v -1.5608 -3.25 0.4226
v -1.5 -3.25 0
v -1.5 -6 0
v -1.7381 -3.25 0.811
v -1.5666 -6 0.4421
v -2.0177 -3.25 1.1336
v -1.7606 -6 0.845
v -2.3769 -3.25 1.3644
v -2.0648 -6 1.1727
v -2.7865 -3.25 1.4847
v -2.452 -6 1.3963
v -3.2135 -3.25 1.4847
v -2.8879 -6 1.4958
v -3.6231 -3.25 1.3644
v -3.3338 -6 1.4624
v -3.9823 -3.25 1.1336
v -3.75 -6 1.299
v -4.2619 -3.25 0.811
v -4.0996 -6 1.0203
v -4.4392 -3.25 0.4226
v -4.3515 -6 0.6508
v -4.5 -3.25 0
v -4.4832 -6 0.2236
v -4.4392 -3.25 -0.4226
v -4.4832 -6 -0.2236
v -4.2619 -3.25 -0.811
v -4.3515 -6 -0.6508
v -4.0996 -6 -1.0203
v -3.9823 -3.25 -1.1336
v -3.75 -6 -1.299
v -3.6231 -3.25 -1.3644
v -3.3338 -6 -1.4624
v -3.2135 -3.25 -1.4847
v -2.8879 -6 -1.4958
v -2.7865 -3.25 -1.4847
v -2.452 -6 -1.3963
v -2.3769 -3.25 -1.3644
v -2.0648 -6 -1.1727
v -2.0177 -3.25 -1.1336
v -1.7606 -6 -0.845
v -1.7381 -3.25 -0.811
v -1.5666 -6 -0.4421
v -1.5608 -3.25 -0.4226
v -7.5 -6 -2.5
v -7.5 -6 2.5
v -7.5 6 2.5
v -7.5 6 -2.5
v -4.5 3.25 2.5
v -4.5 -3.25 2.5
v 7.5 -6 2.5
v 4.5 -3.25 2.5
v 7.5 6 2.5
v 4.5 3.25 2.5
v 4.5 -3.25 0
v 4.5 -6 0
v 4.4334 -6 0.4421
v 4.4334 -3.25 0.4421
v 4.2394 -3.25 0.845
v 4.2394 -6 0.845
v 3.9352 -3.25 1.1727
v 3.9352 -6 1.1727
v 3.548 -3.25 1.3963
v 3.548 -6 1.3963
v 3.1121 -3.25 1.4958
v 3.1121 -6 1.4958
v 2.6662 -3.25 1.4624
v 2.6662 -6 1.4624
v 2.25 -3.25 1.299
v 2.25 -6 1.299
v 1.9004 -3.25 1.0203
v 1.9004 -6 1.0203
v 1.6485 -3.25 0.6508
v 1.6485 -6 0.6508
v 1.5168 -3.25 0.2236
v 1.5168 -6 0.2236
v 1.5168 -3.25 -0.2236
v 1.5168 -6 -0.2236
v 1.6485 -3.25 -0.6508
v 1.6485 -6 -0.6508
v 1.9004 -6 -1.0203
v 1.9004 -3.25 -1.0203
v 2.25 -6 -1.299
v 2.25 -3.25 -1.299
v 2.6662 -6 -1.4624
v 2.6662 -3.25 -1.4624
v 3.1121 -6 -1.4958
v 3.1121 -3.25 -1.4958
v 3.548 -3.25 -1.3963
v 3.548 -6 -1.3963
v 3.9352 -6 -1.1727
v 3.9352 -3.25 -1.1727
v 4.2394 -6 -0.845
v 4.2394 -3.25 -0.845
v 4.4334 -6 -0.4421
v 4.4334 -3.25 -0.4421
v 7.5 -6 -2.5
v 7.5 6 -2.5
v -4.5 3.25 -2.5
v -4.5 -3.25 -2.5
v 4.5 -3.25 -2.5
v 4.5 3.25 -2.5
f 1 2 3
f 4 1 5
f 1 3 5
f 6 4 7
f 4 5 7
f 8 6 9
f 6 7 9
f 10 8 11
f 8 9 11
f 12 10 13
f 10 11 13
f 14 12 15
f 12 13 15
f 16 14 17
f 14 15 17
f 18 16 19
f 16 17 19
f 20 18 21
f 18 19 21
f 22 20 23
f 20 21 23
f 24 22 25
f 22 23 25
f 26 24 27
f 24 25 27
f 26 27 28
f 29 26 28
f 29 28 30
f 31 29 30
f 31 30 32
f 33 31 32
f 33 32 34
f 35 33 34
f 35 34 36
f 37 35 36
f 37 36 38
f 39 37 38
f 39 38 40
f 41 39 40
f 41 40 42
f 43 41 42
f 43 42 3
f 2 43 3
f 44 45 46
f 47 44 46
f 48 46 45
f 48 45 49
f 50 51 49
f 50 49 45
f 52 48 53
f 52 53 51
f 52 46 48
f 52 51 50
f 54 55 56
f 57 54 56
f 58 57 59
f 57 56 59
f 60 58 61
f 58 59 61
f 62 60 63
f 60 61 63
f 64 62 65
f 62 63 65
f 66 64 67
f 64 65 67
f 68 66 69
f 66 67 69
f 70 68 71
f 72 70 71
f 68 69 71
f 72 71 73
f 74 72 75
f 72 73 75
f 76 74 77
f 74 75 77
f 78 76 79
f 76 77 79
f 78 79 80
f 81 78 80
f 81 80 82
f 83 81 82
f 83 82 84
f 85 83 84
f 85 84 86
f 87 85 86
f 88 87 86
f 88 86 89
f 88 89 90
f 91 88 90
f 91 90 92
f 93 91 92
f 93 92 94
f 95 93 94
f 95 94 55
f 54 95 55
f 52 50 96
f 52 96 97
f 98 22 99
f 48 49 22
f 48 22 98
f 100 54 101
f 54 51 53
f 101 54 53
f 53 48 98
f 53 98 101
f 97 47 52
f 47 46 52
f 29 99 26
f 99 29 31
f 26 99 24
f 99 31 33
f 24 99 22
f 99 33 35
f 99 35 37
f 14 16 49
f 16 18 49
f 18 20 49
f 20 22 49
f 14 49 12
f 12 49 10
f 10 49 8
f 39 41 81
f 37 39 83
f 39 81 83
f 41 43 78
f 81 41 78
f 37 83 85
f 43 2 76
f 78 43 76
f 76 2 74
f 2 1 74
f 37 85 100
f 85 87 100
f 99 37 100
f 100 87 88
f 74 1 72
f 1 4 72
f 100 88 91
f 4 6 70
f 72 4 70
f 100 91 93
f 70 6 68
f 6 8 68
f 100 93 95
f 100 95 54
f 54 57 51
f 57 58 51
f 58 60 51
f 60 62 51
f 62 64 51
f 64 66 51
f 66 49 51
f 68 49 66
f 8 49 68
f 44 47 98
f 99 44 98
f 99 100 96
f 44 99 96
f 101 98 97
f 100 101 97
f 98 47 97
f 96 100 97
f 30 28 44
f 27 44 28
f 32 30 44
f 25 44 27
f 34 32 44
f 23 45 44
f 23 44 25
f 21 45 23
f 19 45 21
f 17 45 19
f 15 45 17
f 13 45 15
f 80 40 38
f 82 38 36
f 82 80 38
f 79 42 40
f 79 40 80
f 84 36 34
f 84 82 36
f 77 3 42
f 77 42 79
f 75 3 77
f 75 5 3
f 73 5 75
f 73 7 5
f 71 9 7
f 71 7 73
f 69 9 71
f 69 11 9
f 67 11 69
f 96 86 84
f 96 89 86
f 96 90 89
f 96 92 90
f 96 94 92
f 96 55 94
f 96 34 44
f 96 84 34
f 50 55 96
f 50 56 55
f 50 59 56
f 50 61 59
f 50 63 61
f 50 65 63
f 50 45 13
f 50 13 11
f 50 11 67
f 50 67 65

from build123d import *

# Parameters (mm, degrees)
SKETCH_1_W          = 15
SKETCH_1_H          = 12
EXTRUDE_1_DEPTH     = 2.5
SKETCH_2_W          = 9
SKETCH_2_H          = 6.5
CUT_EXTRUDE_1_DEPTH = 6
CUT_EXTRUDE_2_REACH = 14
SKETCH_3_R          = 1.5


with BuildPart() as part:
    # 草圖1 → 填料-伸長1 (new body, symmetric)
    with BuildSketch(Plane.XY):
        Rectangle(SKETCH_1_W, SKETCH_1_H)
    extrude(amount=EXTRUDE_1_DEPTH, both=True)

    # 草圖2 → 除料-伸長1 (cut, through all)
    with BuildSketch(Plane.XY.offset(2.5)):
        Rectangle(SKETCH_2_W, SKETCH_2_H)
    extrude(amount=-CUT_EXTRUDE_1_DEPTH, mode=Mode.SUBTRACT)

    # 草圖3 → 除料-伸長2 (cut, up to next)
    with BuildSketch(Plane.XZ.offset(6), mode=Mode.PRIVATE) as cut_extrude_2_sk1:
        with Locations((-3, 0)):
            Circle(SKETCH_3_R)
    cut_extrude_2_tool1 = extrude(cut_extrude_2_sk1.sketch, amount=-CUT_EXTRUDE_2_REACH, mode=Mode.PRIVATE) & part.part
    add(cut_extrude_2_tool1.solids().sort_by_distance((-3, -6, 0))[0], mode=Mode.SUBTRACT)
    # 草圖3 → 除料-伸長2 (cut, up to next)
    with BuildSketch(Plane.XZ.offset(6), mode=Mode.PRIVATE) as cut_extrude_2_sk2:
        with Locations((3, 0)):
            Circle(SKETCH_3_R)
    cut_extrude_2_tool2 = extrude(cut_extrude_2_sk2.sketch, amount=-CUT_EXTRUDE_2_REACH, mode=Mode.PRIVATE) & part.part
    add(cut_extrude_2_tool2.solids().sort_by_distance((3, -6, 0))[0], mode=Mode.SUBTRACT)


solid = part.part
